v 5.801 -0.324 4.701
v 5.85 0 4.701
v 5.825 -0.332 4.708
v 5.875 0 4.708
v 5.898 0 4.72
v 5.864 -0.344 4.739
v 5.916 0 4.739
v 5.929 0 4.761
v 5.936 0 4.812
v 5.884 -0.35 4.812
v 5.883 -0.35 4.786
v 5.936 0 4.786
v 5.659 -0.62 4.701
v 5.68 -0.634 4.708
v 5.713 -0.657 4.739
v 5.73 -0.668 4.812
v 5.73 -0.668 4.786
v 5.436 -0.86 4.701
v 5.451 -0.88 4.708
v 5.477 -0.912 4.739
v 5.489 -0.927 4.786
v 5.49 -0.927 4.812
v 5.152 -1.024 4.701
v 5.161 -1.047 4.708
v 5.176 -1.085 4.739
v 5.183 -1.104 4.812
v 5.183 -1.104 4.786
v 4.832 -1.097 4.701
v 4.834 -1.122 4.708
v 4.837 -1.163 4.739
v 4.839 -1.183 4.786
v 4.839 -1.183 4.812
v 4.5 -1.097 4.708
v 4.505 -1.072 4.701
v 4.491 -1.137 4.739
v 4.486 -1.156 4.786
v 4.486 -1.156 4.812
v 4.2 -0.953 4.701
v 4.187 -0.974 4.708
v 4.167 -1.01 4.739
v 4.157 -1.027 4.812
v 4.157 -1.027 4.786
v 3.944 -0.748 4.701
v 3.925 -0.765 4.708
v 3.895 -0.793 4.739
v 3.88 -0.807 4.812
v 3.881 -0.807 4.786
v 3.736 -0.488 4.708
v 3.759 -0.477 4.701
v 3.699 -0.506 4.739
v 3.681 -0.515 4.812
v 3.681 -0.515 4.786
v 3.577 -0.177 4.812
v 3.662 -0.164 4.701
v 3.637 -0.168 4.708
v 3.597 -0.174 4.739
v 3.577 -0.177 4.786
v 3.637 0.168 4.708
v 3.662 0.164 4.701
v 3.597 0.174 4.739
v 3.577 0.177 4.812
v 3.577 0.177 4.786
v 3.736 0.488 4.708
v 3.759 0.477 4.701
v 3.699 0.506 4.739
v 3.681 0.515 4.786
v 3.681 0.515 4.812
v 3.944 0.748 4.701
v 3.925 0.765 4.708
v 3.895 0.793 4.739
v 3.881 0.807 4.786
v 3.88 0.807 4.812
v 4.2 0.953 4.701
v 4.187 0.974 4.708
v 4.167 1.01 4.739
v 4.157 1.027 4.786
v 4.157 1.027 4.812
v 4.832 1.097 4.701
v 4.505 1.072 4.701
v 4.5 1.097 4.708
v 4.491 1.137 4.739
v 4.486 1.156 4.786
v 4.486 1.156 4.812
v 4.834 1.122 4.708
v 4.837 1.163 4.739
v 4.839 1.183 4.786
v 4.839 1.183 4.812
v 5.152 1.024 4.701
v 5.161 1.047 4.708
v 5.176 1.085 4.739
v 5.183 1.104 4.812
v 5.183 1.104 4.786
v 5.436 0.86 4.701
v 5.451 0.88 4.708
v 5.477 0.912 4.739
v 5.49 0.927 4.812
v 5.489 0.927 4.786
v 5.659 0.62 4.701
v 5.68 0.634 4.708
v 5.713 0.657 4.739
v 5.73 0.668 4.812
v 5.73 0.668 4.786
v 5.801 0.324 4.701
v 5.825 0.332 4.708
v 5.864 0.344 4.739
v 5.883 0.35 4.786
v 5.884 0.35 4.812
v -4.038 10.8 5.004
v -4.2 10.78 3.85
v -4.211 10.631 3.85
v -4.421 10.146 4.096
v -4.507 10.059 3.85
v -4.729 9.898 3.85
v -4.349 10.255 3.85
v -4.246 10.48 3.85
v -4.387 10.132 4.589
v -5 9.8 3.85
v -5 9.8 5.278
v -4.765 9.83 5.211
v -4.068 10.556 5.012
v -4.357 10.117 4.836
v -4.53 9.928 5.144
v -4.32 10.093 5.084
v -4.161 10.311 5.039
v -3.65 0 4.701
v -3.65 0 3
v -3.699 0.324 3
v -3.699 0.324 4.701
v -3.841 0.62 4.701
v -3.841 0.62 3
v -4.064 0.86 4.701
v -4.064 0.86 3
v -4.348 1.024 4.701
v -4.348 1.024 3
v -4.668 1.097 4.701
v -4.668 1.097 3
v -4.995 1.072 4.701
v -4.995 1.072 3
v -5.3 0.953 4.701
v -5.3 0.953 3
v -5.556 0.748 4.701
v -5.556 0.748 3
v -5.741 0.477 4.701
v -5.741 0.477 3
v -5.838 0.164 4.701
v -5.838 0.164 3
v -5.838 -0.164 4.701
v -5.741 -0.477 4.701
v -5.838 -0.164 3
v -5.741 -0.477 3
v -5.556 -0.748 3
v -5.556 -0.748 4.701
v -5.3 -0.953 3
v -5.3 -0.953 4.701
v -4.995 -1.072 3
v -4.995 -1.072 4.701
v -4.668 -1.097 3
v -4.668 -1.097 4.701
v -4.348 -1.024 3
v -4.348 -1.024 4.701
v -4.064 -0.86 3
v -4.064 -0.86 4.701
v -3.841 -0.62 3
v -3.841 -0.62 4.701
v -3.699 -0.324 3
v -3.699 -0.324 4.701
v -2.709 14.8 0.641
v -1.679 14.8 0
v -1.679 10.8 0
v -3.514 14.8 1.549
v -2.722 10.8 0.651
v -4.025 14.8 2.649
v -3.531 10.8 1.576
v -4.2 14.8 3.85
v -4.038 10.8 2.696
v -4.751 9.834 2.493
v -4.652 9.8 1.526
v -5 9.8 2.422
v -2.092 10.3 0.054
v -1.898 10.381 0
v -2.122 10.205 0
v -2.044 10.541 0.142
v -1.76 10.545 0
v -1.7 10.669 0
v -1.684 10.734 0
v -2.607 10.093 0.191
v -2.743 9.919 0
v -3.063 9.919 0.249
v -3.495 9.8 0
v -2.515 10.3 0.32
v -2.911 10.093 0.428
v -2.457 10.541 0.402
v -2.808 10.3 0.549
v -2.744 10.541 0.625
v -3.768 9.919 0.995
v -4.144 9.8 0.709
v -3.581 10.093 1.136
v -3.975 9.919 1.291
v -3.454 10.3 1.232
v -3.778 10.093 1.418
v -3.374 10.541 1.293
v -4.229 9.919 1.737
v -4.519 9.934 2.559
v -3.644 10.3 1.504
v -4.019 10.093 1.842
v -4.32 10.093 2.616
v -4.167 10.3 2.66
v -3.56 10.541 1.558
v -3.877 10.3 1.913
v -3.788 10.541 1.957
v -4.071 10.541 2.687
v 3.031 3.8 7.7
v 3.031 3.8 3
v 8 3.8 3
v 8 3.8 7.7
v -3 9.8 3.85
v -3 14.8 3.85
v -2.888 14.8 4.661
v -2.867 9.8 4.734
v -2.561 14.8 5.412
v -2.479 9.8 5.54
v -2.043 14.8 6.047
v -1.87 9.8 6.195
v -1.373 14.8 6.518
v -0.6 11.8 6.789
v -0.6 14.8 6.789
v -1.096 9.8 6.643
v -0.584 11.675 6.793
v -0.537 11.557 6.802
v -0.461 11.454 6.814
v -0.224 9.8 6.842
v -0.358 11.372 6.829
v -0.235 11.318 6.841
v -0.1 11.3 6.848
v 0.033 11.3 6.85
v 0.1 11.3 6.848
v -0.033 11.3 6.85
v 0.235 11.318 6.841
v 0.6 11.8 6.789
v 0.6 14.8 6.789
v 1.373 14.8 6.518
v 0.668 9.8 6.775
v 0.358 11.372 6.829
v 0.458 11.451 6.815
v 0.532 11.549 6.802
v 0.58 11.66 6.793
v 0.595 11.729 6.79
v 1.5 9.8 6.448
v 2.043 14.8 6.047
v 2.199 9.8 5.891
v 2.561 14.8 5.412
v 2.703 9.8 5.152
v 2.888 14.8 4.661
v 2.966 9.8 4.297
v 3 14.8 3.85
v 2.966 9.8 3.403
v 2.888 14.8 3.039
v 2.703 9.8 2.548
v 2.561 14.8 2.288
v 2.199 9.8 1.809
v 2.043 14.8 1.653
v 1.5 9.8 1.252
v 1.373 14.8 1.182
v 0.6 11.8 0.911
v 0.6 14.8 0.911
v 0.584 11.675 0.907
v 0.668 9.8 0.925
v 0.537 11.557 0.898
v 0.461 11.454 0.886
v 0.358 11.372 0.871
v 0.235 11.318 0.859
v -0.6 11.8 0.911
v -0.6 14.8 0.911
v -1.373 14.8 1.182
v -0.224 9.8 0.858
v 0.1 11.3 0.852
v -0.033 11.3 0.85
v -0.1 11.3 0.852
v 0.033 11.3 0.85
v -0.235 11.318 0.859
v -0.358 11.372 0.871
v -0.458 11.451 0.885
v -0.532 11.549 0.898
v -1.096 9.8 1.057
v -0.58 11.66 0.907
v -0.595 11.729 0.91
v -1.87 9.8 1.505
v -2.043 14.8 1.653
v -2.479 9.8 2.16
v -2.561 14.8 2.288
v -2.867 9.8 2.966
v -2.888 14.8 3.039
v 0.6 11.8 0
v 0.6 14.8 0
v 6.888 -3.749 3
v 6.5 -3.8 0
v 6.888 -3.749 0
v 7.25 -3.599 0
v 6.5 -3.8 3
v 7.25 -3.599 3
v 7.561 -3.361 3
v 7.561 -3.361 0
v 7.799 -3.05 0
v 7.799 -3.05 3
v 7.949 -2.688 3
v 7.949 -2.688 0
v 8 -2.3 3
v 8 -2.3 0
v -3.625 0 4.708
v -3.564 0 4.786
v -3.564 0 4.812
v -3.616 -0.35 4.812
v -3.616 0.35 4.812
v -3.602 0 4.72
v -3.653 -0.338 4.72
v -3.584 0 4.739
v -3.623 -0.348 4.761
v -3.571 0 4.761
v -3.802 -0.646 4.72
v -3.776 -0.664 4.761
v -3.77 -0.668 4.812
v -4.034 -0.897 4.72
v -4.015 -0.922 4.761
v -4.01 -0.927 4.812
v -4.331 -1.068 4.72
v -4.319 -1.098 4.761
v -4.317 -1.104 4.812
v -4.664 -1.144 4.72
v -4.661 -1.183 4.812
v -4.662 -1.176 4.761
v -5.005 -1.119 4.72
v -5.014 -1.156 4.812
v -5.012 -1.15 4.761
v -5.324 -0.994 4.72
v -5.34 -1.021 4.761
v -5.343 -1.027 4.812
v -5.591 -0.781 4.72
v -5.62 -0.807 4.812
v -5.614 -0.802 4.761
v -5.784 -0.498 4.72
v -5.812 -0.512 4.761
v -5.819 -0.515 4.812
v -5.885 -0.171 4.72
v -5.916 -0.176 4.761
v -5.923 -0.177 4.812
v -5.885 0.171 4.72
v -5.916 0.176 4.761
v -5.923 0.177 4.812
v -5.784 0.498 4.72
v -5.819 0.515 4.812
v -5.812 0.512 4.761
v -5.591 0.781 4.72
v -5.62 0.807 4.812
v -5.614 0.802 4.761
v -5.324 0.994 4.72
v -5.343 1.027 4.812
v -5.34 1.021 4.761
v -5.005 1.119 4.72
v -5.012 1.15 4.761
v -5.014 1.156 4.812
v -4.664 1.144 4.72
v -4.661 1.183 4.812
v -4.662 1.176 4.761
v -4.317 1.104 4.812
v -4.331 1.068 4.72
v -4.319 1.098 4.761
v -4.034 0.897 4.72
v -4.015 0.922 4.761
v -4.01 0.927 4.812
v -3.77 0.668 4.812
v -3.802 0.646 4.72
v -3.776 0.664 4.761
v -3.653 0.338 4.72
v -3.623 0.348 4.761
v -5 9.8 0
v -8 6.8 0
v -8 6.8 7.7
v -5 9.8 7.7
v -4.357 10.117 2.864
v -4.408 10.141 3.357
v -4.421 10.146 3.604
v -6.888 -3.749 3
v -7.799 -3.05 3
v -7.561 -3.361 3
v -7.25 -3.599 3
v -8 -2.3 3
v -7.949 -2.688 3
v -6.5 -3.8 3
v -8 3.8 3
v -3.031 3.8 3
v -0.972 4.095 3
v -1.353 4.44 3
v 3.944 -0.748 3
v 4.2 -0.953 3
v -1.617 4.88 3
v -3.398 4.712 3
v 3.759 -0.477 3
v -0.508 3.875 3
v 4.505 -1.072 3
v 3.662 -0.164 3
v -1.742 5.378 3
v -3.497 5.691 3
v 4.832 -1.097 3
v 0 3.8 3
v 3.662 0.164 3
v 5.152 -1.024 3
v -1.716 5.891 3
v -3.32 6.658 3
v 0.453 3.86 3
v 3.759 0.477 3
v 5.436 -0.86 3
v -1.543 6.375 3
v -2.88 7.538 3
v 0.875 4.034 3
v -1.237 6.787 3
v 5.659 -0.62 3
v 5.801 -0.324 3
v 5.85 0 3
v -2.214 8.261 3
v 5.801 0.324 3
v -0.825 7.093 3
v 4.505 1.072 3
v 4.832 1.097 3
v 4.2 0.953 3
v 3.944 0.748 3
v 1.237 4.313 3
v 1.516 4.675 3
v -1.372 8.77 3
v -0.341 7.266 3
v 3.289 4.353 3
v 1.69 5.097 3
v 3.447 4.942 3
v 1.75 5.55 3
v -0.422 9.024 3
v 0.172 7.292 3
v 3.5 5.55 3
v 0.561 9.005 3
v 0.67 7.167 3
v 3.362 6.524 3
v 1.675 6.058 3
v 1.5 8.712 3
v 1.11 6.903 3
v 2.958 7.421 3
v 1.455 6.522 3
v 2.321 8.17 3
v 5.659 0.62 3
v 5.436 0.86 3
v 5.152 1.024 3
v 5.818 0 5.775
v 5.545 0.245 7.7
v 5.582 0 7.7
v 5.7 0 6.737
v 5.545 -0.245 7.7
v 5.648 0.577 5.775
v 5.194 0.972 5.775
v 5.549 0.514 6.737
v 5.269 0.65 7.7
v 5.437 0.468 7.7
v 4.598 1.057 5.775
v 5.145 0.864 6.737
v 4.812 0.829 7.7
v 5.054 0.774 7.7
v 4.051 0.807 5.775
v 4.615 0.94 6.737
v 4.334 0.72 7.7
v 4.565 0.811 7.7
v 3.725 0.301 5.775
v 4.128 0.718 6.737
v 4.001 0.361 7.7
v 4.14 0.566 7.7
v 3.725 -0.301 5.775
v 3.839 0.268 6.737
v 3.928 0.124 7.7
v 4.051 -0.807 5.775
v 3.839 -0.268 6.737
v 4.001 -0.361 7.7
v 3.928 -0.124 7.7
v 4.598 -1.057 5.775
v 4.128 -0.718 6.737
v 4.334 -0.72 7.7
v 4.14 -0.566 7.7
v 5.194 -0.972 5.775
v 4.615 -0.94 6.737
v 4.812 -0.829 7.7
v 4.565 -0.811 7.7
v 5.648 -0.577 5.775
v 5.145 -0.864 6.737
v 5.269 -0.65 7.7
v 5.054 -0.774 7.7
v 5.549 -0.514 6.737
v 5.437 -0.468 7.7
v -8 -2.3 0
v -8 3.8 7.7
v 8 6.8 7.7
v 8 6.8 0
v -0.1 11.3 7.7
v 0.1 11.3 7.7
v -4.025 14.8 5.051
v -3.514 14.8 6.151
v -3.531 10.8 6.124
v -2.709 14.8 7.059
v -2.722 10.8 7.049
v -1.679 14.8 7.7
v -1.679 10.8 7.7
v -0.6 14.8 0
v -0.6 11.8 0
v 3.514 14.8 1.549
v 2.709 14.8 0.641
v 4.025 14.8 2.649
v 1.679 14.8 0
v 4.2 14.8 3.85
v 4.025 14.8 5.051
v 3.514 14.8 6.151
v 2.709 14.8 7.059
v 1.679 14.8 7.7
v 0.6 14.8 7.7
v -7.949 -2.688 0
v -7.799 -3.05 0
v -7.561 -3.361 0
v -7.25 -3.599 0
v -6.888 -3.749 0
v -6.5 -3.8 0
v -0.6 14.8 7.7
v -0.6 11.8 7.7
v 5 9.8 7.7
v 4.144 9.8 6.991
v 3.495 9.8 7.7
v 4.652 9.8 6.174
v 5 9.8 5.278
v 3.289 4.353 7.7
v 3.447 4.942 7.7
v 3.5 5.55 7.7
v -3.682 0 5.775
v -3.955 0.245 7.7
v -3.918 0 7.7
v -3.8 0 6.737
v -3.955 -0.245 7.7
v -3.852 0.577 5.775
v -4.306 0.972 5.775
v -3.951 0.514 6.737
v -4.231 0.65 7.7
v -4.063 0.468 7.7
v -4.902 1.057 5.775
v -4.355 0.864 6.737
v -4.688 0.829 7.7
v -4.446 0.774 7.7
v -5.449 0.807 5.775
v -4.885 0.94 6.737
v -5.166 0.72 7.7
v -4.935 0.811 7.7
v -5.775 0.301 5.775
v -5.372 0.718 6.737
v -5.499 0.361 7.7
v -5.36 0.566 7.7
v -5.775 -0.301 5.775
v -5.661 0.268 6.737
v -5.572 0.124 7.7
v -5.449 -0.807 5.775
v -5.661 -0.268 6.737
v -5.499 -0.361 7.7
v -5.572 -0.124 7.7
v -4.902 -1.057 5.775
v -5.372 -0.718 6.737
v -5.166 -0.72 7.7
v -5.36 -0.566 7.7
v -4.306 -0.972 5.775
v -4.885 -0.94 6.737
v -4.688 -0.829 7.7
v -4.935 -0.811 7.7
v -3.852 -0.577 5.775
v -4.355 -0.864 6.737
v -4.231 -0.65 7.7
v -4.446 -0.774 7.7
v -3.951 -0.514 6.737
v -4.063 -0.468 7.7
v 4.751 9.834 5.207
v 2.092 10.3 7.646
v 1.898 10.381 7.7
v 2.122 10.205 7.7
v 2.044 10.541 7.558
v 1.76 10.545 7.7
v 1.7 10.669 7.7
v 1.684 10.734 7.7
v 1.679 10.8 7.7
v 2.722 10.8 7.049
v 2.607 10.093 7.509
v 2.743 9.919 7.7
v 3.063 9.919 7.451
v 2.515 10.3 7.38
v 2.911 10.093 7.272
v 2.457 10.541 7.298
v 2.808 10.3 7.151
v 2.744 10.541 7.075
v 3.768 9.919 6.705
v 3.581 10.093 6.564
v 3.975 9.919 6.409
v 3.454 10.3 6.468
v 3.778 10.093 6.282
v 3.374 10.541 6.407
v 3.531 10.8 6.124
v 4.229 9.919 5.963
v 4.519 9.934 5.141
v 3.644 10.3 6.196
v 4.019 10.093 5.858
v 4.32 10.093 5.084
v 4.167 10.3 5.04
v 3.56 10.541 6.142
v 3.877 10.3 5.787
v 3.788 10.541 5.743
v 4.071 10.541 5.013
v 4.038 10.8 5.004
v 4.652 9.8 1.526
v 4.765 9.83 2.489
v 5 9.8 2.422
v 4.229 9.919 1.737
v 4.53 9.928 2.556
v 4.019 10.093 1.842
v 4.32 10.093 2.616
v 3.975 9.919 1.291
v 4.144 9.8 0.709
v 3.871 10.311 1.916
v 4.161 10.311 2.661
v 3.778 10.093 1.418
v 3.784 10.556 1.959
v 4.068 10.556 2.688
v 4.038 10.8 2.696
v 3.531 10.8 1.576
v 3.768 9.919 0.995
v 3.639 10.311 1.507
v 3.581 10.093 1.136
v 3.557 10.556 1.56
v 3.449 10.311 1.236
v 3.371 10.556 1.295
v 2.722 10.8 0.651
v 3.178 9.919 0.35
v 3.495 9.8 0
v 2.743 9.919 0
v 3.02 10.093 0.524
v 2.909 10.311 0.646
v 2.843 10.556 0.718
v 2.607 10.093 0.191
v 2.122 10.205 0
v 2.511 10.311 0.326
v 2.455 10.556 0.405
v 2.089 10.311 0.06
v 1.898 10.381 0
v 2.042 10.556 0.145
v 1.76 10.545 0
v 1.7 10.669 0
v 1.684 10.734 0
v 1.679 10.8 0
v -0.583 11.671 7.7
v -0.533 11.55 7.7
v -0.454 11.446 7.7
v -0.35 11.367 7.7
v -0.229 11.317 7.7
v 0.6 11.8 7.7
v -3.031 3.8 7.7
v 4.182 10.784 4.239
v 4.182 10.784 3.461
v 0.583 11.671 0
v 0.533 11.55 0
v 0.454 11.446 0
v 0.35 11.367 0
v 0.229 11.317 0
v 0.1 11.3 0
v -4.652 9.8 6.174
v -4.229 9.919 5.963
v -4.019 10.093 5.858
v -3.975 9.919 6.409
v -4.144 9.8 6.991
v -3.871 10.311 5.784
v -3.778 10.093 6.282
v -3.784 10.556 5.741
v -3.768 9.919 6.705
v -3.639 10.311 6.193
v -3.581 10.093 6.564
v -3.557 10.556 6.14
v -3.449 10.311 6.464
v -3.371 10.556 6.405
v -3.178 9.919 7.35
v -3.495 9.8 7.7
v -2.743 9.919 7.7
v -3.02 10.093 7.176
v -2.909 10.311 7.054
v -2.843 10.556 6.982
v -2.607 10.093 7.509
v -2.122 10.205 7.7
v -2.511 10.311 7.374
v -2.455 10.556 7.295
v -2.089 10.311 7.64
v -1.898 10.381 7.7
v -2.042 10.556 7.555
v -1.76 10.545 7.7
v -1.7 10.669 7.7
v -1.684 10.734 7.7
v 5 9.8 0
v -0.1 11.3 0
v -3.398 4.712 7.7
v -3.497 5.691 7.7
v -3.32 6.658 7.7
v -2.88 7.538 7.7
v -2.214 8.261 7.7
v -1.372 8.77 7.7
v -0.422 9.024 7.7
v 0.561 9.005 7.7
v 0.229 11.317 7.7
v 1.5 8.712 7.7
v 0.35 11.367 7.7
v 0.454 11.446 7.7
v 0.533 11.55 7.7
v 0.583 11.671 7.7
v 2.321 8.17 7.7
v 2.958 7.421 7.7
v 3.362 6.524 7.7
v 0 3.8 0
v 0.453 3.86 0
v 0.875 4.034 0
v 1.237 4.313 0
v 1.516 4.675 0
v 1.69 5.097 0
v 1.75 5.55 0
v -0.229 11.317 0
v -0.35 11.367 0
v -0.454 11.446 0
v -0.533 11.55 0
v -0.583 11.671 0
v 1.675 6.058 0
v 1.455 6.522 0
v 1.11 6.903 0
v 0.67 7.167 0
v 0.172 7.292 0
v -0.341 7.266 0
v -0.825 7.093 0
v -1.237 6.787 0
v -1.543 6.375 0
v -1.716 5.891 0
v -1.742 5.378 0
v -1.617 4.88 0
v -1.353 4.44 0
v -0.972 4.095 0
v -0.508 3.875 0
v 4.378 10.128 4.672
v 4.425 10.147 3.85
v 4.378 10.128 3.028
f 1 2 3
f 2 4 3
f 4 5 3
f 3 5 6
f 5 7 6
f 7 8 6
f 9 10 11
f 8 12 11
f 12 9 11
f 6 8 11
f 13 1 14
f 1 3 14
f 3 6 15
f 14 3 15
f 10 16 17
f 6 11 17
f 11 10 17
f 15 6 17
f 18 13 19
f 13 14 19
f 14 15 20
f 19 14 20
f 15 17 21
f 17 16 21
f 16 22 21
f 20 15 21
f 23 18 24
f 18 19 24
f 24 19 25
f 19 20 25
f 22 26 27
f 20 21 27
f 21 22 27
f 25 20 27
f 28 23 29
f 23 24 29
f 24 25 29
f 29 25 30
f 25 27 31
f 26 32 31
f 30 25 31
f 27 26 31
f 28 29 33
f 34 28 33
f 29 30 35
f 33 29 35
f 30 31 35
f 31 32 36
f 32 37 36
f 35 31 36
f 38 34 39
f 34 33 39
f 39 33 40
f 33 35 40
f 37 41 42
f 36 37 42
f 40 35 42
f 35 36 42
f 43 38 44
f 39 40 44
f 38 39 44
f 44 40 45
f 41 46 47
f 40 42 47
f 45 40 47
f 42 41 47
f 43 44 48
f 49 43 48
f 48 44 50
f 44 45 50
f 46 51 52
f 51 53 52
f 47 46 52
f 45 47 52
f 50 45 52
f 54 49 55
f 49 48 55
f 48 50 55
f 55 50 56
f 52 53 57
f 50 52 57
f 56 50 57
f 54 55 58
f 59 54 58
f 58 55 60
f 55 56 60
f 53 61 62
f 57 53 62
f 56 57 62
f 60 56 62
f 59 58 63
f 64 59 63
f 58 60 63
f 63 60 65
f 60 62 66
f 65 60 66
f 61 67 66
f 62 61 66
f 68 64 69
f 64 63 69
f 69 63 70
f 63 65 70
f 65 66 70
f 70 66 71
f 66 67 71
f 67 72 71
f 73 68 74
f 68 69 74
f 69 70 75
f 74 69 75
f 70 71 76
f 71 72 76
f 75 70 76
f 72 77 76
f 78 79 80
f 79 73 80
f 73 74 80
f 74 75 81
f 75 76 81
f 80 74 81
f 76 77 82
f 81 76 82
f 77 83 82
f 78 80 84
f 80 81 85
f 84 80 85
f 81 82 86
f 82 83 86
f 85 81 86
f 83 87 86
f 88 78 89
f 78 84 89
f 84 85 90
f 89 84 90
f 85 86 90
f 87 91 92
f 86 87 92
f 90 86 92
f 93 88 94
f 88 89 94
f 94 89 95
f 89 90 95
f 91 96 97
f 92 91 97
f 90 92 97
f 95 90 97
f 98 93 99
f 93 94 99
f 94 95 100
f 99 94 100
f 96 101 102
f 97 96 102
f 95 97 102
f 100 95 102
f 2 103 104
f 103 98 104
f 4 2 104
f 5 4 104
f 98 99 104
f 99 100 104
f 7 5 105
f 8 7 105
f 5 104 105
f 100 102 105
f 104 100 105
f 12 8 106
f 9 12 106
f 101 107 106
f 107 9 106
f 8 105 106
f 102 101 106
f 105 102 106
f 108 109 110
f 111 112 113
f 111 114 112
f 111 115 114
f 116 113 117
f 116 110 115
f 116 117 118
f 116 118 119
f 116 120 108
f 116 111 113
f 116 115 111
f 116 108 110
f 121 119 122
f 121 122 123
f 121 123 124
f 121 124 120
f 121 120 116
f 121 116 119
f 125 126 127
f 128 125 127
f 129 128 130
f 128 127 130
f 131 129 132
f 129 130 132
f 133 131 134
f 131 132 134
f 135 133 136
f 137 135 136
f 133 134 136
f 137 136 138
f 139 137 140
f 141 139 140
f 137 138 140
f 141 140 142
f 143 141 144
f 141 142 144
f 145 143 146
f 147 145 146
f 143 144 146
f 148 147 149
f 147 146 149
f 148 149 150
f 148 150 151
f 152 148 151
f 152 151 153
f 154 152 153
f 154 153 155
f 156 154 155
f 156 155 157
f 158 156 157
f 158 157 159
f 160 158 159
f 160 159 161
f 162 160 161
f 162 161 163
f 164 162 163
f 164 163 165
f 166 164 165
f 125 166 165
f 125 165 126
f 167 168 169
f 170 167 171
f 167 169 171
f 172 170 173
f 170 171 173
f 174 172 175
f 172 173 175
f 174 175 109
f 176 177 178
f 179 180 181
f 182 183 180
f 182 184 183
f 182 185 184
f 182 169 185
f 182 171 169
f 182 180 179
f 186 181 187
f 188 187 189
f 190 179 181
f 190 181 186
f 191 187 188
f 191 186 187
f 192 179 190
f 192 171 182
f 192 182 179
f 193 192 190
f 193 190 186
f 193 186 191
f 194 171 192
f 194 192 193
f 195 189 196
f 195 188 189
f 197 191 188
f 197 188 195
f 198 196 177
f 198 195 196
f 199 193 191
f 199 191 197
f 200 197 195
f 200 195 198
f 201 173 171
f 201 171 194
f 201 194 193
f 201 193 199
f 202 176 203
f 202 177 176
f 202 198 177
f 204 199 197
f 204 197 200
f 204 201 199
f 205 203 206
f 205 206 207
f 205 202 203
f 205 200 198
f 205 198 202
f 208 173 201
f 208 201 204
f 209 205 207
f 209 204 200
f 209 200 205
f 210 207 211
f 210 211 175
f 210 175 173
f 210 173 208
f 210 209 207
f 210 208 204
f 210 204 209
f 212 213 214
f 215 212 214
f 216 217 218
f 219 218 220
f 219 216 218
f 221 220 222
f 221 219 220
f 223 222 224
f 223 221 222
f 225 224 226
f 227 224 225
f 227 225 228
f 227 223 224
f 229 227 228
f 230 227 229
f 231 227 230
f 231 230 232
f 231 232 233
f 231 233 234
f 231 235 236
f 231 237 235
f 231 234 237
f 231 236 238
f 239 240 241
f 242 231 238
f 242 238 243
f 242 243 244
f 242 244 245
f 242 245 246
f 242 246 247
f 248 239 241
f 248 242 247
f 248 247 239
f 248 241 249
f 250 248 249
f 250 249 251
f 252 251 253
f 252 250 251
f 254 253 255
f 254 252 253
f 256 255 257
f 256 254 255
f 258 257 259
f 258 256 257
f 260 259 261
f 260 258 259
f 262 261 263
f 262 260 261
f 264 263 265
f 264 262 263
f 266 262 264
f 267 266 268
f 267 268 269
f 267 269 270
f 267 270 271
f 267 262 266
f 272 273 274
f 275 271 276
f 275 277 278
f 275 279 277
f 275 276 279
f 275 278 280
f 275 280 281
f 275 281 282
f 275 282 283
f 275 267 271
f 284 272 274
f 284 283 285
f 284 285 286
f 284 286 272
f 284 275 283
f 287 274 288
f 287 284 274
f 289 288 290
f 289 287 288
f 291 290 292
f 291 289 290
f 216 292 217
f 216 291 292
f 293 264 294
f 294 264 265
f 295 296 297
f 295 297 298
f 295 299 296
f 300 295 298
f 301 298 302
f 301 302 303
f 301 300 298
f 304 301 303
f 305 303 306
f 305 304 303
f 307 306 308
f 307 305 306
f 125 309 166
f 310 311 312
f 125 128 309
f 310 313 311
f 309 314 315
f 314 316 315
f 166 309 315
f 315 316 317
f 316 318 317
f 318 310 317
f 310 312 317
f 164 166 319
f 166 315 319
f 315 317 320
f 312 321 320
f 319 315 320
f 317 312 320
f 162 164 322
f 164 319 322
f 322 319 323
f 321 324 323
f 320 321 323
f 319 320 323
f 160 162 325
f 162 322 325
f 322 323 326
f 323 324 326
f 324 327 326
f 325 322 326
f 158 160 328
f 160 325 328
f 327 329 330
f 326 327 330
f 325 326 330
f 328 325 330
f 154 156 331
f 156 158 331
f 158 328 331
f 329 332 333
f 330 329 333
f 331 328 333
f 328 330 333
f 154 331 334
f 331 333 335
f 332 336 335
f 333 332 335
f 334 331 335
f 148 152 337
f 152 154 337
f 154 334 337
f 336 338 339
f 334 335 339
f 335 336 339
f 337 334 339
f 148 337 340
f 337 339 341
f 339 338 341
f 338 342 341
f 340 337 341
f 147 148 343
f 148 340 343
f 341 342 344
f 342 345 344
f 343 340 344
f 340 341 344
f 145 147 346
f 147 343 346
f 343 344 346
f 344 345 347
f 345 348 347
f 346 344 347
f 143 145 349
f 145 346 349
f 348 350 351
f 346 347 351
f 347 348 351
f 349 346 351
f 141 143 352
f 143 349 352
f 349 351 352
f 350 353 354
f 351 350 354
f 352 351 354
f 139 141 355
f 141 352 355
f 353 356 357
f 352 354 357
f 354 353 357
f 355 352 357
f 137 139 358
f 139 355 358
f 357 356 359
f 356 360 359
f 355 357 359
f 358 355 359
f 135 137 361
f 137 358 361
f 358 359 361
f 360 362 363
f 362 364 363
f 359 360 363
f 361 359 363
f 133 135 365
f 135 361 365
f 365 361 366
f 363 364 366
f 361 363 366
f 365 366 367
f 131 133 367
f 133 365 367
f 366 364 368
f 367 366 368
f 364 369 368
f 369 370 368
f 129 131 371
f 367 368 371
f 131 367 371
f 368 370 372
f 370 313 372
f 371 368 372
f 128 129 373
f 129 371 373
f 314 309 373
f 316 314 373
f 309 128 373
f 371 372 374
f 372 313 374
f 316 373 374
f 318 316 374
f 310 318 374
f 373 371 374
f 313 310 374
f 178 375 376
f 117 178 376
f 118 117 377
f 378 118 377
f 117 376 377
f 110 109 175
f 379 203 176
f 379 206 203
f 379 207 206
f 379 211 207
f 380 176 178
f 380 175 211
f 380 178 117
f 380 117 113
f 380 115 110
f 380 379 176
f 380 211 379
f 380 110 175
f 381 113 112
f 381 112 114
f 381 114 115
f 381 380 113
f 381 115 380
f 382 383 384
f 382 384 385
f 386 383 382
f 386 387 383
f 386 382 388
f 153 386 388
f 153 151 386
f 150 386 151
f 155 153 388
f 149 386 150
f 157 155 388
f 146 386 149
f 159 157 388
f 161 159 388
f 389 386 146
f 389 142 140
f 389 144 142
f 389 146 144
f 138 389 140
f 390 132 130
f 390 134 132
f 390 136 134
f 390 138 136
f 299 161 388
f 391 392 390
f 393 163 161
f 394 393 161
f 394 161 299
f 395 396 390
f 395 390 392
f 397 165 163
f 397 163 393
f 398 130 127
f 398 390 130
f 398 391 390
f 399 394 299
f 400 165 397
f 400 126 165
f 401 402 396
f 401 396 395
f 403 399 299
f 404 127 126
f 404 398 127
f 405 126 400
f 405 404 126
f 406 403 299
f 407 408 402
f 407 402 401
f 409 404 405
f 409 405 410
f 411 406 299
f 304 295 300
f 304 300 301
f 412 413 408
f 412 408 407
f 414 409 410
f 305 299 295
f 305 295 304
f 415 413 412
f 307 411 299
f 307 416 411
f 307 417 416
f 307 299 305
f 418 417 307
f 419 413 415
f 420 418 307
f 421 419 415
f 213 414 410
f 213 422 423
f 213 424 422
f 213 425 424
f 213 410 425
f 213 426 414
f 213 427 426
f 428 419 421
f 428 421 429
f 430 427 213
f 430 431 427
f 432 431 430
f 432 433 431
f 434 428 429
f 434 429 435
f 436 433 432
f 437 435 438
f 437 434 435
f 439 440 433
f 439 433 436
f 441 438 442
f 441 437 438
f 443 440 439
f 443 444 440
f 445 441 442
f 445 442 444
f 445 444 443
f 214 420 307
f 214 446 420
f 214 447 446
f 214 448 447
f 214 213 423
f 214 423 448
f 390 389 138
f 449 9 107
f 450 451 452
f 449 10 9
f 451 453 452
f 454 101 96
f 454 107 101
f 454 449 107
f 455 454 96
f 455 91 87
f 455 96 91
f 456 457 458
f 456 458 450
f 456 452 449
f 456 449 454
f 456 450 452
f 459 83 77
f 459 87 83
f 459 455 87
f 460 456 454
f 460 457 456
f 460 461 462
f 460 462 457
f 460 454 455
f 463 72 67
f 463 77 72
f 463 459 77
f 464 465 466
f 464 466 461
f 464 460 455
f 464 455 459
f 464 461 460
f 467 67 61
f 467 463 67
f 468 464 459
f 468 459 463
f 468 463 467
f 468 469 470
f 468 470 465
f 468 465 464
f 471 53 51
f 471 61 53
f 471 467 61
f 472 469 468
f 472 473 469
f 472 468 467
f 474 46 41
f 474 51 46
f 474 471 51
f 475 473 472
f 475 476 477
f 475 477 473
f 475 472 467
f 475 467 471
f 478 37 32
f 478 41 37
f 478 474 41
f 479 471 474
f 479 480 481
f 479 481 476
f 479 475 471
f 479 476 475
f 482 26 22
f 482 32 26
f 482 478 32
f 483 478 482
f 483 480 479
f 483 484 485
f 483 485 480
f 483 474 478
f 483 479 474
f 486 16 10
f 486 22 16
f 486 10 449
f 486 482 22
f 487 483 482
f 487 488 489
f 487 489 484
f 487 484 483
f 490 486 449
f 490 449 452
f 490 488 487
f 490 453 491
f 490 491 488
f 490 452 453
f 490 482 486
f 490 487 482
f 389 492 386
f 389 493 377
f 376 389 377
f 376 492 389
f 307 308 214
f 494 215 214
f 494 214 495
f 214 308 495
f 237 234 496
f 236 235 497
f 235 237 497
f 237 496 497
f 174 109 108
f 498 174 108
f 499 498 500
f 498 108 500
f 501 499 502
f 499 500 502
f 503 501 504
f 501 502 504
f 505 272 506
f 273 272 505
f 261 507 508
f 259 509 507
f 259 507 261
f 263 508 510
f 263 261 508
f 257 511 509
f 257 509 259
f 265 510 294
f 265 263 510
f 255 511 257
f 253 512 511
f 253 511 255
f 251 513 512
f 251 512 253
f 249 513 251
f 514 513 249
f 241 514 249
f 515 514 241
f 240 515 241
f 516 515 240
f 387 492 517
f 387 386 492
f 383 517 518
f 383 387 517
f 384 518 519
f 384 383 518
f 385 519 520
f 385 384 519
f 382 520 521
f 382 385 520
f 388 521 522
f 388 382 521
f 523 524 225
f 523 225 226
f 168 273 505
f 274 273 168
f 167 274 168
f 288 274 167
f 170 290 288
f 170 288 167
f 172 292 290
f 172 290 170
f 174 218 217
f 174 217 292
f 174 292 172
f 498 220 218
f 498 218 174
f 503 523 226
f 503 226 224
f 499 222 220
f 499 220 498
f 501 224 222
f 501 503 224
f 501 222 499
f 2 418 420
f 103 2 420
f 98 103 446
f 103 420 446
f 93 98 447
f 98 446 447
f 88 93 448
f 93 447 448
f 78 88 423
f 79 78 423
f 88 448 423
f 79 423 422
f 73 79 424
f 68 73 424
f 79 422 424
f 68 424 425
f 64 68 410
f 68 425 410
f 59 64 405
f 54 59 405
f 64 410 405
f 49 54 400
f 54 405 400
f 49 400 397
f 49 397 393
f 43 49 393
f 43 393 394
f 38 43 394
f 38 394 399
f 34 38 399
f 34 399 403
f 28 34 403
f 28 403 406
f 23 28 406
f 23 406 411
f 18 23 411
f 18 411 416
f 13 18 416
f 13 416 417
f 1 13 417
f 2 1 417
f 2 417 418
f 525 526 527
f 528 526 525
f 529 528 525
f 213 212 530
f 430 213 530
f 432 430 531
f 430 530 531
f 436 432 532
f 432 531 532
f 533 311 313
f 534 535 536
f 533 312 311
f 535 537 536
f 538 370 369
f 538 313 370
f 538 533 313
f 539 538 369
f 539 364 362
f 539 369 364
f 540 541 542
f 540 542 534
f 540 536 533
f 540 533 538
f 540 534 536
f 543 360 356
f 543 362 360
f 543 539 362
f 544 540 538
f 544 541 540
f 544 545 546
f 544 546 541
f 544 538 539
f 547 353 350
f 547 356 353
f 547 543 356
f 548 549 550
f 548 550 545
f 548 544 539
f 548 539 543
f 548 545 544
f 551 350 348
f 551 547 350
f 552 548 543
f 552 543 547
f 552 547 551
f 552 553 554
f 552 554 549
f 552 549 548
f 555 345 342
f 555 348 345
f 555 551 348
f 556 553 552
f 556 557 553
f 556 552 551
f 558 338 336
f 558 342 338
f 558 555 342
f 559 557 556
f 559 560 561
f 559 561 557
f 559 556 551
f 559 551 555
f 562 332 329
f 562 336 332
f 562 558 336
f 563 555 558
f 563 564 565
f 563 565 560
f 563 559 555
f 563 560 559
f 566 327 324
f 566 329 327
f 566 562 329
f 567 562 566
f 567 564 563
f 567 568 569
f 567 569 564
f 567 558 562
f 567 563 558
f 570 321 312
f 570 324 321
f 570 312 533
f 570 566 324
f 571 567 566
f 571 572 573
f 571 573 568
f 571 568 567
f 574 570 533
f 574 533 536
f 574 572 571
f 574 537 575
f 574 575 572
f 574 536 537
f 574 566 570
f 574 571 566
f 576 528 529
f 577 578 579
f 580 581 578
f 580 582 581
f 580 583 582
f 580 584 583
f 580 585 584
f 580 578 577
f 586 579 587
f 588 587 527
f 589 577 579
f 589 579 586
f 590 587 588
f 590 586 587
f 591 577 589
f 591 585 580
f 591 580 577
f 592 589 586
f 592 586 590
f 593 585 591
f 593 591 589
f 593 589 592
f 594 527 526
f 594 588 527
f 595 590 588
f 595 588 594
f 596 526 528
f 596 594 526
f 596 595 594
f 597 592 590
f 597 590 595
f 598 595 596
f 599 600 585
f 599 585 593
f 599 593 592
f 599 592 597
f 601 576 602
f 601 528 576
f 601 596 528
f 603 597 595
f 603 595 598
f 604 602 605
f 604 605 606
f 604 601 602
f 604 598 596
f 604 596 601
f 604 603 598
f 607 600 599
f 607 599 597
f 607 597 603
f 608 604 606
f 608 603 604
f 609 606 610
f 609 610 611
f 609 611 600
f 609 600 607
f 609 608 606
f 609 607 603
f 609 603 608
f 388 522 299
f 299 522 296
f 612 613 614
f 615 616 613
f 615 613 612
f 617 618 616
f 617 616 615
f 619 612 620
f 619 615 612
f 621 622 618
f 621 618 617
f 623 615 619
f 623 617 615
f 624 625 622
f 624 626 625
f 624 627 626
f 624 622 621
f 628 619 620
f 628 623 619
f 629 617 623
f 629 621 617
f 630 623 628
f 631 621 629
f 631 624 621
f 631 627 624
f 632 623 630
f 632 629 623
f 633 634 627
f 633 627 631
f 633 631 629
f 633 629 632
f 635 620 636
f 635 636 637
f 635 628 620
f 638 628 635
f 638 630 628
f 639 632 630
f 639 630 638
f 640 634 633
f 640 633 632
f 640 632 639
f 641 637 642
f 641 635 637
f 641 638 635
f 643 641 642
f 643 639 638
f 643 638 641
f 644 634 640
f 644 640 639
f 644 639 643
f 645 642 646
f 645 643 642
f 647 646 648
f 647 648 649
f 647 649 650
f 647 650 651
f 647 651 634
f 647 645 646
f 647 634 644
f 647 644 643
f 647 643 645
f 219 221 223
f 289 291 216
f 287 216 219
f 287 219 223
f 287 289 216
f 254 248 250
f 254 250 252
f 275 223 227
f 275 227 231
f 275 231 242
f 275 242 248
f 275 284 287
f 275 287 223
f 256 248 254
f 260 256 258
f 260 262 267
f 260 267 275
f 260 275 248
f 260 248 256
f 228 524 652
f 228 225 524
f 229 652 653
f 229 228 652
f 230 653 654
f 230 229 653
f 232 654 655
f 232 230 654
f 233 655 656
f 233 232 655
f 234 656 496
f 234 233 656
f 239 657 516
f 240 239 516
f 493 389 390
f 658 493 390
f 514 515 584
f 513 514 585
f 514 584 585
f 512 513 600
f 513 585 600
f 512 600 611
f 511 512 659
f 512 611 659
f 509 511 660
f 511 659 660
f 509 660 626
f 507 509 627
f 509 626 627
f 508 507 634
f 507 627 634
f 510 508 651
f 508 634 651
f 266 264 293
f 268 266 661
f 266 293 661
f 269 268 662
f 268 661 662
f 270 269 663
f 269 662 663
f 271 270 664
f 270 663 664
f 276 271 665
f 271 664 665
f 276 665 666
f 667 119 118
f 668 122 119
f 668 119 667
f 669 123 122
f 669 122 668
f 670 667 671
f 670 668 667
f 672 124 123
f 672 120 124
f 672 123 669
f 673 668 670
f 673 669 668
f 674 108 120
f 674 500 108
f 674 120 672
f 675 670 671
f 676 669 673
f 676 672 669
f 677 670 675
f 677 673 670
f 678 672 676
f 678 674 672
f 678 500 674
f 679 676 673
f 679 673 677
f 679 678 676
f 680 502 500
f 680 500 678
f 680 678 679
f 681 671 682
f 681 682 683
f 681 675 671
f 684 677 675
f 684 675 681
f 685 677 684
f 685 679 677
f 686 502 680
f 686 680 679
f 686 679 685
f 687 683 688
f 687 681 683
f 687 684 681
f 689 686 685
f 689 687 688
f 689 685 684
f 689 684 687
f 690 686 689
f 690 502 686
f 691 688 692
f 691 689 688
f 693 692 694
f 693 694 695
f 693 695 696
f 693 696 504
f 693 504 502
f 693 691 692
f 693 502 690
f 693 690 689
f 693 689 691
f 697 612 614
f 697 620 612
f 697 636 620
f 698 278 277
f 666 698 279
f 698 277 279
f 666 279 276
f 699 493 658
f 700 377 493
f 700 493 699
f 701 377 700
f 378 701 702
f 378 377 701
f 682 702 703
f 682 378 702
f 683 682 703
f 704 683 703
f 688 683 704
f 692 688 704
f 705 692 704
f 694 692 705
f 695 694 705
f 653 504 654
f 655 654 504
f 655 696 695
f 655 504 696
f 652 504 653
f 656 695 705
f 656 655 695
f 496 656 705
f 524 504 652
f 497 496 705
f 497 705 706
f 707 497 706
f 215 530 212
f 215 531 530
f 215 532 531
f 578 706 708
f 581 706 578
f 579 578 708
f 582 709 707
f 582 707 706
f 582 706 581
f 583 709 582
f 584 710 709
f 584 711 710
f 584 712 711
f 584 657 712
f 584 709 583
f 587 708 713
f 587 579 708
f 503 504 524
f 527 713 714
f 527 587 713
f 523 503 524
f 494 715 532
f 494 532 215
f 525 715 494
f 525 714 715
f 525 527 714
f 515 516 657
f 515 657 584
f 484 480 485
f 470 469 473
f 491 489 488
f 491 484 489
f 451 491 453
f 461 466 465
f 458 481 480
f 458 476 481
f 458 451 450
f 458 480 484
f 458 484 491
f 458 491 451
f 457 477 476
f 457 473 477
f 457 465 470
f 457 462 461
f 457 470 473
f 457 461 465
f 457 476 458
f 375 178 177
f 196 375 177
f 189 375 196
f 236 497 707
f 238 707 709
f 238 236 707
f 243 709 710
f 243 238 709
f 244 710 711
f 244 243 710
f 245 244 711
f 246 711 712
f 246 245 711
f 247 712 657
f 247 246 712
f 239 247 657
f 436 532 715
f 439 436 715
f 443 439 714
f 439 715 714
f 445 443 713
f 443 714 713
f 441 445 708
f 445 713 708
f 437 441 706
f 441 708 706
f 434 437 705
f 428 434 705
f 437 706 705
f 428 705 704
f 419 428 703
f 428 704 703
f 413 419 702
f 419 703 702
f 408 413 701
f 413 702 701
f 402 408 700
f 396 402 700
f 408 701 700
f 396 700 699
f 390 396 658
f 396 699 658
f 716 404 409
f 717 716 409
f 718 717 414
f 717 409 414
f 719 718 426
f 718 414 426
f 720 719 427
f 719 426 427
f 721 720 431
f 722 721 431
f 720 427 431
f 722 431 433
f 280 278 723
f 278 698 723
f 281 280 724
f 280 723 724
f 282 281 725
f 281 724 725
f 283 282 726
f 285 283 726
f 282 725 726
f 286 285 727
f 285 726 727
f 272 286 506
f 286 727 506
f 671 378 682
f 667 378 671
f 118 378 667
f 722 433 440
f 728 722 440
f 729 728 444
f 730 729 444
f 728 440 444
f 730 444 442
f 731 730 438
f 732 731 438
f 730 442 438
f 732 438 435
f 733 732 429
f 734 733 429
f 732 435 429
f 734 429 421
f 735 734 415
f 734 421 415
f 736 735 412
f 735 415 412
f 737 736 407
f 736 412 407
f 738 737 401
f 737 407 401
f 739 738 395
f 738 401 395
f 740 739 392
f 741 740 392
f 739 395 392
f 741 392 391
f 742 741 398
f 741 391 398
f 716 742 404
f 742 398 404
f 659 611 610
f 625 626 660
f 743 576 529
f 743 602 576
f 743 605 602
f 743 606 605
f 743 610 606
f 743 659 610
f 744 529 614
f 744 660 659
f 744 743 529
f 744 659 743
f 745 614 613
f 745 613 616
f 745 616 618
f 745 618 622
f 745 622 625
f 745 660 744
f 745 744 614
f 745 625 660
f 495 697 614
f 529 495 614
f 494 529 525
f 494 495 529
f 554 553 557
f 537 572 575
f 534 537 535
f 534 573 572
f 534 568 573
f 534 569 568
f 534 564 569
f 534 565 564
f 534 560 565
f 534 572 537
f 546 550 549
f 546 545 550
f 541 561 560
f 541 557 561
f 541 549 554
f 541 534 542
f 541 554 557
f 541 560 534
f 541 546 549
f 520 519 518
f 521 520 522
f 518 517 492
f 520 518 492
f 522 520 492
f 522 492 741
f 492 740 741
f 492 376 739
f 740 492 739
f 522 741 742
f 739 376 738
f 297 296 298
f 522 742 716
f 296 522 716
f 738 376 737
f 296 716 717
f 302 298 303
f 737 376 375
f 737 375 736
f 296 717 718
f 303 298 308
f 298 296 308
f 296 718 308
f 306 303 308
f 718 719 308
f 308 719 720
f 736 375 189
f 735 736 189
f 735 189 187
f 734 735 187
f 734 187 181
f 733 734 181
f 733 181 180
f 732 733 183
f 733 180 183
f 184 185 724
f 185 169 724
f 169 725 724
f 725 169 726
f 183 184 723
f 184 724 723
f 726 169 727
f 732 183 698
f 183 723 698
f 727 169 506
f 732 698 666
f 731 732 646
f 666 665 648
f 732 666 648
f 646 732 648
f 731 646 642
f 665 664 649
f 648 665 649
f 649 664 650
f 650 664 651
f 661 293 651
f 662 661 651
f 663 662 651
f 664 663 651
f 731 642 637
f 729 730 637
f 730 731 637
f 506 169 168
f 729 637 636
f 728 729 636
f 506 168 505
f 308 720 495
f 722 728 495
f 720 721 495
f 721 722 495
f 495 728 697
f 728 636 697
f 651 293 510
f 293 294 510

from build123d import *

# Parameters (mm, degrees)
F0_W         = 16
F0_H         = 7.6
F1_DEPTH     = 3
F2_R         = 1.1
F3_DEPTH     = 1.7
F5_R         = 1.2
F6_DEPTH     = 3
F6_TAPER     = 7
F7_S5_R      = 1.1
F7_T6_DEPTH  = 3
F7_S11_R     = 1.1
F7_T12_DEPTH = 3
F4_W         = 16
F4_H         = 6
F8_DEPTH     = 7.7
F9_R         = 3
F10_DEPTH    = 5
F11_W        = 1.2
F11_H        = 3.5
F12_DEPTH    = 7.7
F13_R        = 1.5
F14_R        = 0.5
F16_DEPTH    = 4.7
F17_DEPTH    = 7.7
F18_SIZE     = 3
F19_R        = 1


# Not quite as in the source:
# - a fillet or chamfer that OpenCascade refuses, or shapes differently, is made with other operations: its cross-section is extruded or revolved along the edge and cut away or added


with BuildPart() as f1:
    # F0 (on Top) → F1 (new body)
    with BuildSketch(Plane.XY):
        Rectangle(F0_W, F0_H)
    extrude(amount=F1_DEPTH)

    # F2 (on face) → F3 (join)
    with BuildSketch(Plane.XY.offset(3)):
        with Locations((-4.75, 0)):
            Circle(F2_R)
        with Locations((4.75, 0)):
            Circle(F2_R)
    extrude(amount=F3_DEPTH)

    # F5 (on face) → F6 (join)
    with BuildSketch(Plane.XY.offset(4.7)):
        with Locations((-4.75, 0)):
            Circle(F5_R)
        with Locations((4.75, 0)):
            Circle(F5_R)
    extrude(amount=F6_DEPTH, taper=F6_TAPER)

    # F7: fillet of radius 0.1 on 2 edges, made by hand


with BuildPart() as f7_tool2:
    # F7_s3 → F7_t4 (revolve)
    with BuildSketch(Plane.XZ):
        with BuildLine():
            ThreePointArc((-3.6630294386, 4.7), (-3.5881338666, 4.7337379952), (-3.5637748235, 4.8121869343))
            Line((-3.5637748235, 4.8121869343), (-3.55, 4.7))
            Line((-3.55, 4.7), (-3.6630294386, 4.7))
        make_face()
    revolve(axis=Axis((-4.75, 0, 4.7), (0, 0, -1)))

    # F7_s5 → F7_t6 (cut, symmetric)
    with BuildSketch(Plane.XY.offset(4.8)):
        with Locations((-4.75, 0)):
            Circle(F7_S5_R)
    extrude(amount=F7_T6_DEPTH, both=True, mode=Mode.SUBTRACT)


with BuildPart() as f1_1:
    add(f1.part)

    # F7_t1: cut F7_tool2
    add(f7_tool2.part, mode=Mode.SUBTRACT)


with BuildPart() as f7_tool8:
    # F7_s9 → F7_t10 (revolve)
    with BuildSketch(Plane.XZ):
        with BuildLine():
            ThreePointArc((5.8369705614, 4.7), (5.9118661334, 4.7337379952), (5.9362251765, 4.8121869343))
            Line((5.9362251765, 4.8121869343), (5.95, 4.7))
            Line((5.95, 4.7), (5.8369705614, 4.7))
        make_face()
    revolve(axis=Axis((4.75, 0, 4.7), (0, 0, -1)))

    # F7_s11 → F7_t12 (cut, symmetric)
    with BuildSketch(Plane.XY.offset(4.8)):
        with Locations((4.75, 0)):
            Circle(F7_S11_R)
    extrude(amount=F7_T12_DEPTH, both=True, mode=Mode.SUBTRACT)


with BuildPart() as f1_2:
    add(f1_1.part)

    # F7_t7: cut F7_tool8
    add(f7_tool8.part, mode=Mode.SUBTRACT)

    # F4 (on Top) → F8 (join, through all)
    with BuildSketch(Plane.XY):
        with Locations((0, 6.8)):
            Rectangle(F4_W, F4_H)
    extrude(amount=F8_DEPTH)

    # F9 (on face) → F10 (join)
    with BuildSketch(Plane(origin=(0, 9.8, 0), x_dir=(-1, 0, 0), z_dir=(0, 1, 0))):
        with BuildLine():
            ThreePointArc((1.6785410332, 0), (3.5135361347, 1.5488994306), (4.2, 3.85))
            ThreePointArc((4.2, 3.85), (3.5135361347, 6.1511005694), (1.6785410332, 7.7))
            Line((1.6785410332, 7.7), (-1.6785410332, 7.7))
            ThreePointArc((-1.6785410332, 7.7), (-4.2, 3.85), (-1.6785410332, 0))
            Line((-1.6785410332, 0), (1.6785410332, 0))
        make_face()
        with Locations((0, 3.85)):
            Circle(F9_R, mode=Mode.SUBTRACT)
    extrude(amount=F10_DEPTH)

    # F11 (on face) → F12 (cut, through all)
    with BuildSketch(Plane.XY.offset(7.7)):
        with Locations((0, 13.05)):
            Rectangle(F11_W, F11_H)
    extrude(amount=-F12_DEPTH, mode=Mode.SUBTRACT)

    # F13
    f13_edges = [f1_2.edges().sort_by_distance(p)[0] for p in [
        (-8, -3.8, 1.5),
        (8, -3.8, 1.5),
    ]]
    fillet(f13_edges, radius=F13_R)

    # F14
    f14_edges = [f1_2.edges().sort_by_distance(p)[0] for p in [
        (-0.6, 11.3, 7.244694),
        (0.6, 11.3, 7.244694),
        (0.6, 11.3, 0.455306),
        (-0.6, 11.3, 0.455306),
    ]]
    fillet(f14_edges, radius=F14_R)

    # F15 (on face) → F16 (cut, through all)
    with BuildSketch(Plane.XY.offset(7.7)):
        with BuildLine():
            ThreePointArc((3.0310889132, 3.8), (3.380740392, 4.6441333421), (3.5, 5.55))
            ThreePointArc((3.5, 5.55), (-0.9058666579, 8.930740392), (-3.0310889132, 3.8))
            Line((-3.0310889132, 3.8), (0, 3.8))
            Line((0, 3.8), (3.0310889132, 3.8))
        make_face()
        with BuildLine():
            ThreePointArc((1.75, 5.55), (1.2374368671, 4.3125631329), (0, 3.8))
            ThreePointArc((0, 3.8), (-1.2374368671, 6.7874368671), (1.75, 5.55))
        make_face(mode=Mode.SUBTRACT)
        with BuildLine():
            ThreePointArc((1.75, 5.55), (-1.2374368671, 6.7874368671), (0, 3.8))
            ThreePointArc((0, 3.8), (1.2374368671, 4.3125631329), (1.75, 5.55))
        make_face()
    extrude(amount=-F16_DEPTH, mode=Mode.SUBTRACT)

    # F15 (on face) → F17 (cut, through all)
    with BuildSketch(Plane.XY.offset(7.7)):
        with BuildLine():
            ThreePointArc((1.75, 5.55), (-1.2374368671, 6.7874368671), (0, 3.8))
            ThreePointArc((0, 3.8), (1.2374368671, 4.3125631329), (1.75, 5.55))
        make_face()
    extrude(amount=-F17_DEPTH, mode=Mode.SUBTRACT)

    # F18
    f18_edges = [f1_2.edges().sort_by_distance(p)[0] for p in [
        (-8, 9.8, 3.85),
        (8, 9.8, 3.85),
    ]]
    chamfer(f18_edges, length=F18_SIZE)

    # F19
    f19_edges = [f1_2.edges().sort_by_distance(p)[0] for p in [
        (-4.2, 9.8, 3.85),
        (4.2, 9.8, 3.85),
    ]]
    fillet(f19_edges, radius=F19_R)


solid = f1_2.part
